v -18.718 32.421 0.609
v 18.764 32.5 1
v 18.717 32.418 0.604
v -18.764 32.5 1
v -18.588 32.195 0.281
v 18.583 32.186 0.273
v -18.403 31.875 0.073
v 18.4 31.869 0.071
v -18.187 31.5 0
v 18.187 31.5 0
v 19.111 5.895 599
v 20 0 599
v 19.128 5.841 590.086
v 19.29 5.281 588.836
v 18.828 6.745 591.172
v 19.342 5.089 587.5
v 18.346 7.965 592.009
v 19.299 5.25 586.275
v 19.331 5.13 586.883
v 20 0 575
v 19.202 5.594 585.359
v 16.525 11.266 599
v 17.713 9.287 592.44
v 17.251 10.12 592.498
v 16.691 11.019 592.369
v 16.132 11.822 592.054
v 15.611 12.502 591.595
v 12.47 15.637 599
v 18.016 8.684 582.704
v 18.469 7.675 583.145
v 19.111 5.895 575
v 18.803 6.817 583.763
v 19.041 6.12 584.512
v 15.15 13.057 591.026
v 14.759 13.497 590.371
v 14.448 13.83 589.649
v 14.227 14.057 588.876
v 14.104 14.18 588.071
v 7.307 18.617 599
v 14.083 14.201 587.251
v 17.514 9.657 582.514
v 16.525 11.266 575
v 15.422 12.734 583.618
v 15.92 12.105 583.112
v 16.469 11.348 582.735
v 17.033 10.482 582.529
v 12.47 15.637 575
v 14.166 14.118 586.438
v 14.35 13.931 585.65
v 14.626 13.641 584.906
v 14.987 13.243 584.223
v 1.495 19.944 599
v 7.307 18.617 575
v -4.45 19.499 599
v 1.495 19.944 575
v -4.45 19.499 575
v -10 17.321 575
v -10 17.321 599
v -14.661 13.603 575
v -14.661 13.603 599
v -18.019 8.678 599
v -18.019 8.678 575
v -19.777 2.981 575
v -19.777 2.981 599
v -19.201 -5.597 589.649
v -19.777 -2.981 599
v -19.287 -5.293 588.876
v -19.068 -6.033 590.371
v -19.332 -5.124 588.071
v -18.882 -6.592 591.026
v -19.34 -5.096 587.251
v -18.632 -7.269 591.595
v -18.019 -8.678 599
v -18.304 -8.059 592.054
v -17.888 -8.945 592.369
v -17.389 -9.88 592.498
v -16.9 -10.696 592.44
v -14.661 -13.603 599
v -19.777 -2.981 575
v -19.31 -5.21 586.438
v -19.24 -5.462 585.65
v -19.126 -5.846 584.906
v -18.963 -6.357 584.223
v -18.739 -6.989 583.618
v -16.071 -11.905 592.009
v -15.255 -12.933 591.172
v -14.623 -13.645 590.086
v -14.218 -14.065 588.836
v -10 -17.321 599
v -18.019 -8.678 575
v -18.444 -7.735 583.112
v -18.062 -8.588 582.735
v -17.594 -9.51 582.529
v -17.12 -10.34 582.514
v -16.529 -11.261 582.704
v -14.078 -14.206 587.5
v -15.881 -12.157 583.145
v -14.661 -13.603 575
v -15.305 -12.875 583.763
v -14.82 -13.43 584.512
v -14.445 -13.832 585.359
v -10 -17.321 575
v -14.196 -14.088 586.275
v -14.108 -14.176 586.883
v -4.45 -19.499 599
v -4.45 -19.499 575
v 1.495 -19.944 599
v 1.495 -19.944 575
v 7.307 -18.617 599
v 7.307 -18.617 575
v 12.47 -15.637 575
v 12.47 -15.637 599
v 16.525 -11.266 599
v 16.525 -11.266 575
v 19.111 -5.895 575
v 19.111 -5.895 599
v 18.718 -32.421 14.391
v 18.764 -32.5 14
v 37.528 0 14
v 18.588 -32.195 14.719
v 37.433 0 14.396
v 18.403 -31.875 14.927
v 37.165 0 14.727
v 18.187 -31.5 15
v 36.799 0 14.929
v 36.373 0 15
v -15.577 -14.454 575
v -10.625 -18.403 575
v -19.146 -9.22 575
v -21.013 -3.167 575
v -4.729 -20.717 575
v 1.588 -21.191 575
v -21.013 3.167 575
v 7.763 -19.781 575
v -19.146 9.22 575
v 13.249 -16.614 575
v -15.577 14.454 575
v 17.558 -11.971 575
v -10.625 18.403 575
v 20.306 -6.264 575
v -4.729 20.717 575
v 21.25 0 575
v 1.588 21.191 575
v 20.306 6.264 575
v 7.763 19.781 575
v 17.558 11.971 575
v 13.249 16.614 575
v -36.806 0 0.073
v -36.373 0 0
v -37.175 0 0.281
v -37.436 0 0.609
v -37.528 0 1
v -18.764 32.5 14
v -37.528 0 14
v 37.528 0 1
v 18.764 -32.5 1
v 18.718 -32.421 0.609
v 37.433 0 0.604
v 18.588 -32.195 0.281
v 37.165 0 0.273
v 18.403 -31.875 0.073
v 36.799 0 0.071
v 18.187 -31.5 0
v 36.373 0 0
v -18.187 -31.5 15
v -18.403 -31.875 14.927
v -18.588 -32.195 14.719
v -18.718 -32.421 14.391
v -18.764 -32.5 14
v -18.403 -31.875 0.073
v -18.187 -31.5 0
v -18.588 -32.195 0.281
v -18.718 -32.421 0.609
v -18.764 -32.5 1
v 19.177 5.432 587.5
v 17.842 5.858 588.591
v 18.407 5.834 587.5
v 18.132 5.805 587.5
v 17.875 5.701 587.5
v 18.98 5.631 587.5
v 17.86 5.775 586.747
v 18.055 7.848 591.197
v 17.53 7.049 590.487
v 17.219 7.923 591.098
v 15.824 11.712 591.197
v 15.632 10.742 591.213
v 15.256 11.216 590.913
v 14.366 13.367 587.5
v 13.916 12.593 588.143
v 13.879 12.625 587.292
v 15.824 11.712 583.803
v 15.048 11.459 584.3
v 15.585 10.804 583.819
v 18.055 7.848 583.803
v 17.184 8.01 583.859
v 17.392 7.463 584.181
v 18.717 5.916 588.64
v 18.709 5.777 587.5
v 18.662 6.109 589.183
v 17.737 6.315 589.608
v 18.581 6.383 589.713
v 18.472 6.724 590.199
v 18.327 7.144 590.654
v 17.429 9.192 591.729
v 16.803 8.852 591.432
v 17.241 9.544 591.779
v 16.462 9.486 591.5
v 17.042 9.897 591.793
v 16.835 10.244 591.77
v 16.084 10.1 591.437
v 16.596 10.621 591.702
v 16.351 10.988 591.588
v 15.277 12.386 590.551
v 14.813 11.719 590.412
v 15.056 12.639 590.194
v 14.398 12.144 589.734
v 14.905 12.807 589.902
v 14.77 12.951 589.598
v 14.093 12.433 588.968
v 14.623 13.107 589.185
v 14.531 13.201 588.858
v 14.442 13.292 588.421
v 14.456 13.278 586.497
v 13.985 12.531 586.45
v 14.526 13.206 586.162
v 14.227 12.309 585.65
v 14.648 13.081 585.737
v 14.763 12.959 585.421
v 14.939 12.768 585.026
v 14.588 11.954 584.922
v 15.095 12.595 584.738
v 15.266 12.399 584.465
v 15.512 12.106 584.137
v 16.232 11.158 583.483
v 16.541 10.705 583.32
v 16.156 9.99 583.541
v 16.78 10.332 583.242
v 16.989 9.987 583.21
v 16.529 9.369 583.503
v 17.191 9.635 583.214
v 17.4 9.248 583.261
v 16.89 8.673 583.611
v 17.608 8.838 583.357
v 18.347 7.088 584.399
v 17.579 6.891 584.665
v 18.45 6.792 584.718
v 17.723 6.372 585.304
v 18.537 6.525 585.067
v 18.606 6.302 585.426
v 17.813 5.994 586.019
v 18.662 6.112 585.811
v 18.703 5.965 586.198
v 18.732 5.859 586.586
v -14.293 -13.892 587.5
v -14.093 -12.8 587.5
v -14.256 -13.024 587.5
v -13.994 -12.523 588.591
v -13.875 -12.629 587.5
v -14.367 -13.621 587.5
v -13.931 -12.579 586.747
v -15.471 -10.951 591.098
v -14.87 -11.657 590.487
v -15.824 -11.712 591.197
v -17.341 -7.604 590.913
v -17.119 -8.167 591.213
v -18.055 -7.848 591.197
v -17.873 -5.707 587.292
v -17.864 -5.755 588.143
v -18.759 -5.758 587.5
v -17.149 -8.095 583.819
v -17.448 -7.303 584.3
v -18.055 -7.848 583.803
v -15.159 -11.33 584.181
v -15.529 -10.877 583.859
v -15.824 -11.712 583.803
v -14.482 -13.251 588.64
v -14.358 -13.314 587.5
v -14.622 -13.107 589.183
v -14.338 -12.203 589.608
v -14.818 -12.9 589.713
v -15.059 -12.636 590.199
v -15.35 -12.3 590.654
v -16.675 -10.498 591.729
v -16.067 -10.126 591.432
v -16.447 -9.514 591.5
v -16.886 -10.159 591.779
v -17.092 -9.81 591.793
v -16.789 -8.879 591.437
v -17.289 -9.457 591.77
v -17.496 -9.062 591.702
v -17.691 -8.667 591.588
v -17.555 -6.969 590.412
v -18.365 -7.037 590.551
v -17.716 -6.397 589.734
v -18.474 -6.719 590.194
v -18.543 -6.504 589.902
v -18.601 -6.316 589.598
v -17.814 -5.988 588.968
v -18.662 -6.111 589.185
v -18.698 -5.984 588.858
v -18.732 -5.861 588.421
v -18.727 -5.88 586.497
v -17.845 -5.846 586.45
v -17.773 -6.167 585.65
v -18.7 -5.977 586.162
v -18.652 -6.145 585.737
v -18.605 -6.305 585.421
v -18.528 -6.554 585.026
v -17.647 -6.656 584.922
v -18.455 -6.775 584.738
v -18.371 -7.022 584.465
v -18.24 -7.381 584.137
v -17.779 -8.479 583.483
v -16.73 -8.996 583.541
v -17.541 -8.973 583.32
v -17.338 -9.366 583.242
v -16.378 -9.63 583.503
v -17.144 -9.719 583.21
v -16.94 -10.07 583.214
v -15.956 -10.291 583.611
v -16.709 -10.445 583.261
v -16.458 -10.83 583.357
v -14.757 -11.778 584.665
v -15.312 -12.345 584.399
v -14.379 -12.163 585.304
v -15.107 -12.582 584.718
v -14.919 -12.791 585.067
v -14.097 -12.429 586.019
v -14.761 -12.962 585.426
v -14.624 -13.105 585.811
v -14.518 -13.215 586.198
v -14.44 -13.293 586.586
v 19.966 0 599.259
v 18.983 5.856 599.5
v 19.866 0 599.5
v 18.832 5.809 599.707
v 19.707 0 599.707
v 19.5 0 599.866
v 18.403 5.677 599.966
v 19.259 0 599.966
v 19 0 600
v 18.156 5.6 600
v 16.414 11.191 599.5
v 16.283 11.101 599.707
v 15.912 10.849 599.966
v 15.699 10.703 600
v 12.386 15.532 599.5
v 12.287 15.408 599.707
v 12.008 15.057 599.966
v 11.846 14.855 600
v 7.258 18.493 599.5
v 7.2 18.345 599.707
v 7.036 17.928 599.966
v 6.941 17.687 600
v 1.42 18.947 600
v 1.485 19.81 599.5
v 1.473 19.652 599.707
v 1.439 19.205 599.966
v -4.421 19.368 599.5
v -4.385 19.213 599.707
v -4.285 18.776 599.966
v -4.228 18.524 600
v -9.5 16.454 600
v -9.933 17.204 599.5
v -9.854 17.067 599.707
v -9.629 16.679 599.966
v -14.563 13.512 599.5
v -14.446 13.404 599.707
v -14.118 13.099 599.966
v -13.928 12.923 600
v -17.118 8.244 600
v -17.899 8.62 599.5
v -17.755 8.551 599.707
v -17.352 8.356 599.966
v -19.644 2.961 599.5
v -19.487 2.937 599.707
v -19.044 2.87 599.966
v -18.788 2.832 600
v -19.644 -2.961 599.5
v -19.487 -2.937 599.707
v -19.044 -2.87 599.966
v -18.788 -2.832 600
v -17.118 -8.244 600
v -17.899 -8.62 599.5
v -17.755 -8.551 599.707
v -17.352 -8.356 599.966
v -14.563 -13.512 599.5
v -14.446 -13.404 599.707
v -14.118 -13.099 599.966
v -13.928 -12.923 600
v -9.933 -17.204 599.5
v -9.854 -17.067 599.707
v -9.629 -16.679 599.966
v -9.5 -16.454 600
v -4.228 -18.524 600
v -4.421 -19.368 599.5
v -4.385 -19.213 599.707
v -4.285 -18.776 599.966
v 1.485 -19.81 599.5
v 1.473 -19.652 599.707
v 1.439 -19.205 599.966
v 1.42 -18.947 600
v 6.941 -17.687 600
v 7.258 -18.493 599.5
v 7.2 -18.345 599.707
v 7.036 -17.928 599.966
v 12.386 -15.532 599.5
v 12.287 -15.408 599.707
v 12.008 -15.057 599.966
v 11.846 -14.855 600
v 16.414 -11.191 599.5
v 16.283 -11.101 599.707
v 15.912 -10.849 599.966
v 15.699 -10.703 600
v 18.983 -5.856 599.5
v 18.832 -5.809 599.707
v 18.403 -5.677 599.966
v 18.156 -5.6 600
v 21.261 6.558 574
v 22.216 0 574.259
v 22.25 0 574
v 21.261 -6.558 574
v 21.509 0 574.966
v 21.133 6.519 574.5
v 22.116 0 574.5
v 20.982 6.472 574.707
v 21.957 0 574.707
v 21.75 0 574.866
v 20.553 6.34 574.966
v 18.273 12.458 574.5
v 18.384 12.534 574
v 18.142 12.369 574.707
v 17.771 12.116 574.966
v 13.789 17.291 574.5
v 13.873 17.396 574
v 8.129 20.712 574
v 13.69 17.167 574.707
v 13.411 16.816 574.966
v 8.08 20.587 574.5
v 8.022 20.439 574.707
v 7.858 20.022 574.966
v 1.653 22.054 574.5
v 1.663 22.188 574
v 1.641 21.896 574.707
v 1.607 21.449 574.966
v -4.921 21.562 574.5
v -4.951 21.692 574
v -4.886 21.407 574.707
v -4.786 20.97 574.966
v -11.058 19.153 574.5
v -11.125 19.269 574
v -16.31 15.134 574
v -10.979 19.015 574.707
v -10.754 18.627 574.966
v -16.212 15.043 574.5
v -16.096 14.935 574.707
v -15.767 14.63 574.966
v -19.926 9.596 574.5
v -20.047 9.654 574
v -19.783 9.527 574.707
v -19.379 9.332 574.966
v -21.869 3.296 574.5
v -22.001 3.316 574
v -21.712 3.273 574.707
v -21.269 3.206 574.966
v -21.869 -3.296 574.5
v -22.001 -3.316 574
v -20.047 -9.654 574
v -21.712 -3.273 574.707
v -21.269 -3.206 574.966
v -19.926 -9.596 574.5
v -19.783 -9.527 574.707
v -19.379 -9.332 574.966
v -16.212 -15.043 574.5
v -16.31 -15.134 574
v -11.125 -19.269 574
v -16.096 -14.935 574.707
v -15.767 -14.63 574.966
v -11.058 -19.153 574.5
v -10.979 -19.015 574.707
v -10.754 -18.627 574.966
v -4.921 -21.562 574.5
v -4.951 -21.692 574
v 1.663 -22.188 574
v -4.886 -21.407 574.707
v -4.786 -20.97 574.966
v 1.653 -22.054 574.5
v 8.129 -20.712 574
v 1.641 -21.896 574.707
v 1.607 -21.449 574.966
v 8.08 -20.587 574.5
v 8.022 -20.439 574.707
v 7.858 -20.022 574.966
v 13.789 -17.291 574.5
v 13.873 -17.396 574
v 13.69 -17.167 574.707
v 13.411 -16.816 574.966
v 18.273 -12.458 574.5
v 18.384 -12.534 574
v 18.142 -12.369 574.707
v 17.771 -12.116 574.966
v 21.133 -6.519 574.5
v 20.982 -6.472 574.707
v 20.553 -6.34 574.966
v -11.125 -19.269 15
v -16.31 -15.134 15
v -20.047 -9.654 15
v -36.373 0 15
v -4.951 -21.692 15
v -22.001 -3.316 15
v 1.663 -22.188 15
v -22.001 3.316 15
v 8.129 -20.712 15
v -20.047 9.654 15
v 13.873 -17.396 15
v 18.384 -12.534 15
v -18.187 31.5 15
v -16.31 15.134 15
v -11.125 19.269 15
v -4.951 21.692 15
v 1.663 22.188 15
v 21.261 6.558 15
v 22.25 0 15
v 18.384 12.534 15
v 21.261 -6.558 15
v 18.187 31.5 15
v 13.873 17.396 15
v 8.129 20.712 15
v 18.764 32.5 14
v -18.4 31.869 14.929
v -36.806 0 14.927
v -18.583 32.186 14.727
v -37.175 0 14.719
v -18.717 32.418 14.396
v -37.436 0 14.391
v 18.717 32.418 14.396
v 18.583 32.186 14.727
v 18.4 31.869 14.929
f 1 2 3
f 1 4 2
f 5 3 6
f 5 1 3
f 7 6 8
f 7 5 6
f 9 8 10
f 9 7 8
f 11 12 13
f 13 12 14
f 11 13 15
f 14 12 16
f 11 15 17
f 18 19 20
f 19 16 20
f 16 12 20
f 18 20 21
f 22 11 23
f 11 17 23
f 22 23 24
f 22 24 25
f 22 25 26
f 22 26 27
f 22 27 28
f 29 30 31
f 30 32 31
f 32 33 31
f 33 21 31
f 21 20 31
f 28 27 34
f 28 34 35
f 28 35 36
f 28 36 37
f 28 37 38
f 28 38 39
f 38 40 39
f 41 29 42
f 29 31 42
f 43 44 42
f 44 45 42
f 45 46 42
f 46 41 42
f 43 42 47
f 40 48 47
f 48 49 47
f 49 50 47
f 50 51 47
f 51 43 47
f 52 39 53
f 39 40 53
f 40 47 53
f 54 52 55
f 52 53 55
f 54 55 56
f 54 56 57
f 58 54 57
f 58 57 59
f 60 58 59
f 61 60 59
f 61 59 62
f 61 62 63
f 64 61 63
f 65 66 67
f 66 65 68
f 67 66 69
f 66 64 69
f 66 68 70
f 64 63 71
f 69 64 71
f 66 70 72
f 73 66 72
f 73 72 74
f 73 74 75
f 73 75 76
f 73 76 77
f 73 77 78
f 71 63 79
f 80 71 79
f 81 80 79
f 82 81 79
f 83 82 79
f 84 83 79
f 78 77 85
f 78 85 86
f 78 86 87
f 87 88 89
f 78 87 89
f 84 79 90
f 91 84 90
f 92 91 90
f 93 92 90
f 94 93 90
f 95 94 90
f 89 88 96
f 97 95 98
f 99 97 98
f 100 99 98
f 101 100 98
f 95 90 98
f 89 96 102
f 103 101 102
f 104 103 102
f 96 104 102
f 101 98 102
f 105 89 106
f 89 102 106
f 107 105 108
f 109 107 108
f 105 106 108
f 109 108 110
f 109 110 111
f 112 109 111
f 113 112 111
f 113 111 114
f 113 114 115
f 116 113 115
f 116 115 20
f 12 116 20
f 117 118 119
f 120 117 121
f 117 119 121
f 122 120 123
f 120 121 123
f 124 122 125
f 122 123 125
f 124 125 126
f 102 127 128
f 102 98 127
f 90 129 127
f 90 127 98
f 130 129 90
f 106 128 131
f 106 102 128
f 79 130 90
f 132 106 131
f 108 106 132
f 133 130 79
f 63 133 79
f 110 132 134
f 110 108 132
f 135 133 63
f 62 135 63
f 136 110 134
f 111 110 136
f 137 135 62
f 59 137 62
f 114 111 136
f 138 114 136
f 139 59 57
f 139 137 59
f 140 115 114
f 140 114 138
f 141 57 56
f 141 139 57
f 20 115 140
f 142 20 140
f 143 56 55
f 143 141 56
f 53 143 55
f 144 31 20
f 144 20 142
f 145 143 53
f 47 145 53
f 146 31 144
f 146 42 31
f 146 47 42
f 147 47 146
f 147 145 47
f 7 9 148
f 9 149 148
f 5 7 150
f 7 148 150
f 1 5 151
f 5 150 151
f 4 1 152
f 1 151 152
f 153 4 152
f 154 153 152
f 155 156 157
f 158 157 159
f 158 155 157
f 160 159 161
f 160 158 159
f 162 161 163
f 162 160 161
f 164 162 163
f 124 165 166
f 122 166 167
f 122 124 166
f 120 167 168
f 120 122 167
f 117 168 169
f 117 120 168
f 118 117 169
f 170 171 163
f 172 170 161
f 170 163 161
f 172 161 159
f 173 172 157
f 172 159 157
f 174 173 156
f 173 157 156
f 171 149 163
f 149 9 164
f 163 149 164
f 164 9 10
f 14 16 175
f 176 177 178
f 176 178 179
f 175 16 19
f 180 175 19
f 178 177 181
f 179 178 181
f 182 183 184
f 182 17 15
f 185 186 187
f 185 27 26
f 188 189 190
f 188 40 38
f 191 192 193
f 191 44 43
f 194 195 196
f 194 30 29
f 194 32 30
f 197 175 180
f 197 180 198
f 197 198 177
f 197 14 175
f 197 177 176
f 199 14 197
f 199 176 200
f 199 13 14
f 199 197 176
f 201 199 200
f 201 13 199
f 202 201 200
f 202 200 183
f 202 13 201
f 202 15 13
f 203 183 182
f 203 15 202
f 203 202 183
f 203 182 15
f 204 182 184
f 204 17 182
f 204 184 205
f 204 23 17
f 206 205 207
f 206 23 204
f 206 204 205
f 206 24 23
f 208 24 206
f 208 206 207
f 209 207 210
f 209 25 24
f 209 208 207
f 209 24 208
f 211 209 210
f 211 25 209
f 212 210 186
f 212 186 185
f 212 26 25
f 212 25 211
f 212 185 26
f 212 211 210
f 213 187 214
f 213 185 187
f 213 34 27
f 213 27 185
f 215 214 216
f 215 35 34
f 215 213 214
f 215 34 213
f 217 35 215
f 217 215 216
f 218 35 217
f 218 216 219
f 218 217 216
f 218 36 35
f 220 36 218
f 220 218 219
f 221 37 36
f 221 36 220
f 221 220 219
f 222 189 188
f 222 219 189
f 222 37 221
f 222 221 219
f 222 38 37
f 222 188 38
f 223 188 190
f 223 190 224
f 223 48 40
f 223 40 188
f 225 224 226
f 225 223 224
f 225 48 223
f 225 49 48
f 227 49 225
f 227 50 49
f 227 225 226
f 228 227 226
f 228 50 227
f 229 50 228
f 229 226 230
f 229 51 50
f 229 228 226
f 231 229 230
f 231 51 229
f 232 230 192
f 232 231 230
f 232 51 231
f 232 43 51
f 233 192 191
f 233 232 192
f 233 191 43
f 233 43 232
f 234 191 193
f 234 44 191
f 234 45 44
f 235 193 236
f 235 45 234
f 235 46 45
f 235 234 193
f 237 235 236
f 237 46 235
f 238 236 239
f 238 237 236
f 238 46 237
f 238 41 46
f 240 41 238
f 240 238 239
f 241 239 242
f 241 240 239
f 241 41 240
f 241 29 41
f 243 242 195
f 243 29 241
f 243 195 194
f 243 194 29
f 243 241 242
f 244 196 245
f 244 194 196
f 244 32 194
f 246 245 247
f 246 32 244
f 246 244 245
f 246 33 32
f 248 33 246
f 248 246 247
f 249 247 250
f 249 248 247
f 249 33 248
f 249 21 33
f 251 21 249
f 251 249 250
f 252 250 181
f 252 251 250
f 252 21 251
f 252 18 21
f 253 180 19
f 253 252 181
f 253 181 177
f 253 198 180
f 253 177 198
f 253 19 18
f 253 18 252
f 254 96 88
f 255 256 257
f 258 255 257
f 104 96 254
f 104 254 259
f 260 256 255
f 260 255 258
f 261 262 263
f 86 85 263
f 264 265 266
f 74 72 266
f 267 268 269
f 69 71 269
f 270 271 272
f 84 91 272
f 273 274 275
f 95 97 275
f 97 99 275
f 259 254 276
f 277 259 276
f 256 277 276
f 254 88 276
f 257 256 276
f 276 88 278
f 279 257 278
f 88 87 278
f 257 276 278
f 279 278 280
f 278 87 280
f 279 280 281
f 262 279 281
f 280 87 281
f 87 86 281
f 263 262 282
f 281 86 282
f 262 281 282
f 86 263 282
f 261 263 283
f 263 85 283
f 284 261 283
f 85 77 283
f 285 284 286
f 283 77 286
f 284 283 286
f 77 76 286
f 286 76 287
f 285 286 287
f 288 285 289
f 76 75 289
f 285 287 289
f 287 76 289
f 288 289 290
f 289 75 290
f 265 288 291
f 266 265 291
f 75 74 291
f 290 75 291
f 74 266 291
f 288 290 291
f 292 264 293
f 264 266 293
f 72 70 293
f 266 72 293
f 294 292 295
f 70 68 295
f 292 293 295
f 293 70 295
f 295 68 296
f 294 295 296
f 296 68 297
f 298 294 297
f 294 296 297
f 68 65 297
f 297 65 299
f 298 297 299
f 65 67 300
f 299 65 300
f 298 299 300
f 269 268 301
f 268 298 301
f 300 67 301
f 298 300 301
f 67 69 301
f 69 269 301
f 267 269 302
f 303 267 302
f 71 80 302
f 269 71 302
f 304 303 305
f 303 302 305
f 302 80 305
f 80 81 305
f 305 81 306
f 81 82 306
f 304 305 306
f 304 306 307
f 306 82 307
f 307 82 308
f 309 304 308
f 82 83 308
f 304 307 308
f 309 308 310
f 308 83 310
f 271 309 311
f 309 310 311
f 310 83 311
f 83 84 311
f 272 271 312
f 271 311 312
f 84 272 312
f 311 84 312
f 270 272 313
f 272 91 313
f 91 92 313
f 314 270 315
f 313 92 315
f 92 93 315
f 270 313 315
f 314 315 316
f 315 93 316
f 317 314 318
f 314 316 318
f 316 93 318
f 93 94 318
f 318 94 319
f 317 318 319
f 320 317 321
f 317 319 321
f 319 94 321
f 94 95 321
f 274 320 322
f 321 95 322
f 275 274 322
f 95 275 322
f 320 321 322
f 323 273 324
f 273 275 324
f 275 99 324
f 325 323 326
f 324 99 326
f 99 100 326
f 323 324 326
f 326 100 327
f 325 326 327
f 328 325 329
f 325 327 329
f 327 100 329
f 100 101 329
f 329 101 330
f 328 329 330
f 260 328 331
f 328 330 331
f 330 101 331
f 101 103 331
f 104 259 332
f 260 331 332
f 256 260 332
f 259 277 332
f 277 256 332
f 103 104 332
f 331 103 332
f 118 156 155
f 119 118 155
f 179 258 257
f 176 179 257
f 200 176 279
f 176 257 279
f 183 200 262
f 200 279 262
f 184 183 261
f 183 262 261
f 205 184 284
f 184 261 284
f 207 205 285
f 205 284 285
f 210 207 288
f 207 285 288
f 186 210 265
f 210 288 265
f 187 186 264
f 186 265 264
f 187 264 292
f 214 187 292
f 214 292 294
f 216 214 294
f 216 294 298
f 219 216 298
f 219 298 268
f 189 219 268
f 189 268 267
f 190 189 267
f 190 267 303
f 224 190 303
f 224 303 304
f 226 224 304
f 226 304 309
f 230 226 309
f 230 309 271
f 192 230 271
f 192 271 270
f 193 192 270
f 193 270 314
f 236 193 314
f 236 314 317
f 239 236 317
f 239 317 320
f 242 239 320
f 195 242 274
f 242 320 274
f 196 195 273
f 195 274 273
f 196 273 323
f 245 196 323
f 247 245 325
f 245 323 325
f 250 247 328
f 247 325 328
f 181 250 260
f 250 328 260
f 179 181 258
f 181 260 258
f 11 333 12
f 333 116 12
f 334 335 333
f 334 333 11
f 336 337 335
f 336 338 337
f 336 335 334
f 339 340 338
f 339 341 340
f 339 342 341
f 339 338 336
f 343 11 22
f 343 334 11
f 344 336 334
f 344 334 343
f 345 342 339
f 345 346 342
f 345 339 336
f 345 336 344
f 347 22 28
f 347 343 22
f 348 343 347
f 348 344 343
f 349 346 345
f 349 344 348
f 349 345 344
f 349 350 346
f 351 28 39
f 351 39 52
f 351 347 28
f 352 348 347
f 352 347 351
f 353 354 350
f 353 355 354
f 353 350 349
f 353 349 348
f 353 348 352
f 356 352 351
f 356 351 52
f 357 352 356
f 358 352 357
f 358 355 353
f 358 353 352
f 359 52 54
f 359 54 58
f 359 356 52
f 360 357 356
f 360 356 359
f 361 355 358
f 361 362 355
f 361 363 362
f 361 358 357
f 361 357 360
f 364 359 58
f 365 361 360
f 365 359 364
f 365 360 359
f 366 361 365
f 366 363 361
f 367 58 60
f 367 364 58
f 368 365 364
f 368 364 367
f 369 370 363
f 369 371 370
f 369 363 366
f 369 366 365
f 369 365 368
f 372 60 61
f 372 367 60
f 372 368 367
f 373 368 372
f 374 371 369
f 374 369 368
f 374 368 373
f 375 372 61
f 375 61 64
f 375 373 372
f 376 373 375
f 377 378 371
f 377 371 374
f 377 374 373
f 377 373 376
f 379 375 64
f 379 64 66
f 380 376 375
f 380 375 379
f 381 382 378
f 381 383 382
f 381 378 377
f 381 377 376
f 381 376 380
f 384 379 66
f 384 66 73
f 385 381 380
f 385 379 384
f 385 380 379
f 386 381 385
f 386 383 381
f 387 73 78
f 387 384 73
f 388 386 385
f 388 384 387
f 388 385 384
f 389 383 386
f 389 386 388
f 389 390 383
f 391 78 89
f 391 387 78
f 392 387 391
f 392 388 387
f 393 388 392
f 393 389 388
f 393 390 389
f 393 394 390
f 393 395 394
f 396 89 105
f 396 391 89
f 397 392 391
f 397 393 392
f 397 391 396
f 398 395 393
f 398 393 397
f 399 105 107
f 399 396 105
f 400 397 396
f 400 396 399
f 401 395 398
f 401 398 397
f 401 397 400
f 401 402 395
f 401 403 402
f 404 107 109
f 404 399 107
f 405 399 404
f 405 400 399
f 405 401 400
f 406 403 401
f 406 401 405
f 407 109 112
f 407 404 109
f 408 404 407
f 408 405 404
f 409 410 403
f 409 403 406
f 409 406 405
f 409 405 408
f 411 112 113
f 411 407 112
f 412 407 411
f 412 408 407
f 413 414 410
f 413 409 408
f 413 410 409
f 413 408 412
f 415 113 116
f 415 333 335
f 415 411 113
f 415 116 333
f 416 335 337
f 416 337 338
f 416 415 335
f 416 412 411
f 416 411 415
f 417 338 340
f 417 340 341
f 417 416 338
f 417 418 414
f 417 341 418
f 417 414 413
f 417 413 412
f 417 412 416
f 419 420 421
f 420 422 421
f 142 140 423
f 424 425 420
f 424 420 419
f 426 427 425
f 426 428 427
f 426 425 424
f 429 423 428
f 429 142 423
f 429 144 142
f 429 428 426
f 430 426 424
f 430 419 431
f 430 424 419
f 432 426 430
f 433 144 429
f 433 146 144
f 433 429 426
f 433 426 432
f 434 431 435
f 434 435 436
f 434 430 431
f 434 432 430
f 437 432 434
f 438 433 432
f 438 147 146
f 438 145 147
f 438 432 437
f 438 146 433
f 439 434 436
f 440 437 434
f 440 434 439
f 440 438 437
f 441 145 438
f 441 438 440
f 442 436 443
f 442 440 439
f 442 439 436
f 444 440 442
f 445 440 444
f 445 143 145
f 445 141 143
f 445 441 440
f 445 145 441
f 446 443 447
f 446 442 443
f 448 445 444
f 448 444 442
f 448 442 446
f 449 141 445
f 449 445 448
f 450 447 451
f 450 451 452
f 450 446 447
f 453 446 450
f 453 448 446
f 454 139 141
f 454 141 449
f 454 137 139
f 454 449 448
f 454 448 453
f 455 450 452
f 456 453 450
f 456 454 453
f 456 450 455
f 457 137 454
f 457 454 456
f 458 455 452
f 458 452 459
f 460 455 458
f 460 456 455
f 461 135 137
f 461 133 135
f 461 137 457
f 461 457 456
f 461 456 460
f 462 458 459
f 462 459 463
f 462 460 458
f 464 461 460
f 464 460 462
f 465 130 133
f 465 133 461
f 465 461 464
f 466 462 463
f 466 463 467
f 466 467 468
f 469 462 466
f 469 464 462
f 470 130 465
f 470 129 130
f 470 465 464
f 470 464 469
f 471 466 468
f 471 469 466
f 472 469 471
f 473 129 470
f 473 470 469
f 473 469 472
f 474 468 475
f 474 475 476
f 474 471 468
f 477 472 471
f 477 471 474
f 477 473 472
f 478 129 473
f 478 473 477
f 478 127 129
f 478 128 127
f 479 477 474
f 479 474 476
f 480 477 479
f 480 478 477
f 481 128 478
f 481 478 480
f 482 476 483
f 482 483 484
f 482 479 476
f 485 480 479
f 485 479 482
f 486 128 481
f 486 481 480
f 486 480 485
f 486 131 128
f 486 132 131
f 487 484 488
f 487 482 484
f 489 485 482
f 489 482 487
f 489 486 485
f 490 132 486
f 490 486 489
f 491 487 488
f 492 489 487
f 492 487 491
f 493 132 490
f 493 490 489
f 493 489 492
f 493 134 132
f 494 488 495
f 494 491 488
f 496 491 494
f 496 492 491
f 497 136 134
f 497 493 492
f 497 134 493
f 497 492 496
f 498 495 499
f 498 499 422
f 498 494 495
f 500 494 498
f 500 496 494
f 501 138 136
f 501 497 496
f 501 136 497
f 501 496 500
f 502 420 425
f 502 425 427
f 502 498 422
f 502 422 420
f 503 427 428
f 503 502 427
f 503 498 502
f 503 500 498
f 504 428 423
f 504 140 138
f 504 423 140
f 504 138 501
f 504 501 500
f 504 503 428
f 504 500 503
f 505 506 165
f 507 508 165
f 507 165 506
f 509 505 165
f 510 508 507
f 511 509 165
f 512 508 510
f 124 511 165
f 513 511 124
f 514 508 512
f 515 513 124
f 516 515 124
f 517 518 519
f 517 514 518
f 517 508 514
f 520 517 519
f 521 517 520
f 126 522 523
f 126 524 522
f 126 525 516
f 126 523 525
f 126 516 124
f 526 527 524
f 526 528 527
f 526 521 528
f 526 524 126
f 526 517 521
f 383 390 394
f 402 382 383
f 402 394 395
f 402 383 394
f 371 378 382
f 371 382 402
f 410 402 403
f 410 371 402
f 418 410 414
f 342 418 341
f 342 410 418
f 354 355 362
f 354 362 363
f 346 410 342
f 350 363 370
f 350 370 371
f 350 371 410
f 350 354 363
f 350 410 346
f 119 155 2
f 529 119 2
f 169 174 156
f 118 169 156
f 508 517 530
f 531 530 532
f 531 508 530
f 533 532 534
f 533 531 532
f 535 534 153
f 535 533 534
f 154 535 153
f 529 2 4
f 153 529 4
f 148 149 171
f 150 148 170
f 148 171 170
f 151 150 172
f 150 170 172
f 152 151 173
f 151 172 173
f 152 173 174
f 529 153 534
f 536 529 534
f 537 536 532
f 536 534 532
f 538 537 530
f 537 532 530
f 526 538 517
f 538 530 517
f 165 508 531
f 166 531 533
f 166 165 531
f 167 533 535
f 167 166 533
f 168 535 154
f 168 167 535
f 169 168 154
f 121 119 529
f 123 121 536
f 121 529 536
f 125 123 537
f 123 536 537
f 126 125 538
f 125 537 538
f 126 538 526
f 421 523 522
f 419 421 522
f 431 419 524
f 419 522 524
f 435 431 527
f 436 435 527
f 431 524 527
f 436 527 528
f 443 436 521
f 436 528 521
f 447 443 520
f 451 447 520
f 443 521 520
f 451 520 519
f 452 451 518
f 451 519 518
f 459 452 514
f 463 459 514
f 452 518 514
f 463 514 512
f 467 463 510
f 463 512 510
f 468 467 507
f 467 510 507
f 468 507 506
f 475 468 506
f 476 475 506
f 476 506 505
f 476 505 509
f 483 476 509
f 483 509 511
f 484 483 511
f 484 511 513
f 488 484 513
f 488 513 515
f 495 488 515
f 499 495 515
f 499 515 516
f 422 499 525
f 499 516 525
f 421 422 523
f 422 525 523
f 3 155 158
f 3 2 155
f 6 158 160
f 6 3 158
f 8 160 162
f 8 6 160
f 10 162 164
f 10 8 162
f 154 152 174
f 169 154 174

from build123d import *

# Parameters (mm, degrees)
EXTRUDE_1_DEPTH     = 15
SKETCH_2_R          = 22.25
EXTRUDE_2_DEPTH     = 560
SKETCH_3_R          = 20
EXTRUDE_3_DEPTH     = 25
SKETCH_4_R          = 4
CUT_EXTRUDE_4_DEPTH = 606.548993339
FILLET_1_R          = 1


with BuildPart() as part:
    # 草图1 → 拉伸1 (new body)
    with BuildSketch(Plane.XY):
        Polygon((37.527767497, 0), (18.763883749, 32.5), (-18.763883749, 32.5), (-37.527767497, 0), (-18.763883749, -32.5), (18.763883749, -32.5), align=None)
    extrude(amount=EXTRUDE_1_DEPTH)

    # 草图2 → 拉伸2 (add)
    with BuildSketch(Plane.XY.offset(15)):
        Circle(SKETCH_2_R)
    extrude(amount=EXTRUDE_2_DEPTH)

    # 草图3 → 拉伸3 (add)
    with BuildSketch(Plane.XY.offset(575)):
        Circle(SKETCH_3_R)
    extrude(amount=EXTRUDE_3_DEPTH)

    # 草图4 → 拉伸4 (cut, through all)
    with BuildSketch(Plane(origin=(-28.145825623, -16.25, 0), x_dir=(0, 0, 1), z_dir=(-0.8660254037844388, -0.4999999999999997, 0))):
        with Locations(Location((587.5, 0, 0), (0, 0, 270))):
            Circle(SKETCH_4_R)
    extrude(amount=-CUT_EXTRUDE_4_DEPTH, mode=Mode.SUBTRACT)

    # 圆角1
    fillet_1_edges = [part.edges().sort_by_distance(p)[0] for p in [
        (0, 32.5, 15),
        (-28.145825623, 16.25, 15),
        (-28.145825623, -16.25, 15),
        (0, -32.5, 15),
        (-22.25, 0, 575),
        (-20, 0, 600),
        (-18.970562748, -6.333857356, 587.5),
        (14.970562748, 13.262060586, 587.5),
        (28.145825623, -16.25, 15),
        (0, -32.5, 0),
        (-28.145825623, -16.25, 0),
        (-28.145825623, 16.25, 0),
        (28.145825623, 16.25, 15),
        (0, 32.5, 0),
        (28.145825623, 16.25, 0),
        (28.145825623, -16.25, 0),
    ]]
    fillet(fillet_1_edges, radius=FILLET_1_R)


solid = part.part
